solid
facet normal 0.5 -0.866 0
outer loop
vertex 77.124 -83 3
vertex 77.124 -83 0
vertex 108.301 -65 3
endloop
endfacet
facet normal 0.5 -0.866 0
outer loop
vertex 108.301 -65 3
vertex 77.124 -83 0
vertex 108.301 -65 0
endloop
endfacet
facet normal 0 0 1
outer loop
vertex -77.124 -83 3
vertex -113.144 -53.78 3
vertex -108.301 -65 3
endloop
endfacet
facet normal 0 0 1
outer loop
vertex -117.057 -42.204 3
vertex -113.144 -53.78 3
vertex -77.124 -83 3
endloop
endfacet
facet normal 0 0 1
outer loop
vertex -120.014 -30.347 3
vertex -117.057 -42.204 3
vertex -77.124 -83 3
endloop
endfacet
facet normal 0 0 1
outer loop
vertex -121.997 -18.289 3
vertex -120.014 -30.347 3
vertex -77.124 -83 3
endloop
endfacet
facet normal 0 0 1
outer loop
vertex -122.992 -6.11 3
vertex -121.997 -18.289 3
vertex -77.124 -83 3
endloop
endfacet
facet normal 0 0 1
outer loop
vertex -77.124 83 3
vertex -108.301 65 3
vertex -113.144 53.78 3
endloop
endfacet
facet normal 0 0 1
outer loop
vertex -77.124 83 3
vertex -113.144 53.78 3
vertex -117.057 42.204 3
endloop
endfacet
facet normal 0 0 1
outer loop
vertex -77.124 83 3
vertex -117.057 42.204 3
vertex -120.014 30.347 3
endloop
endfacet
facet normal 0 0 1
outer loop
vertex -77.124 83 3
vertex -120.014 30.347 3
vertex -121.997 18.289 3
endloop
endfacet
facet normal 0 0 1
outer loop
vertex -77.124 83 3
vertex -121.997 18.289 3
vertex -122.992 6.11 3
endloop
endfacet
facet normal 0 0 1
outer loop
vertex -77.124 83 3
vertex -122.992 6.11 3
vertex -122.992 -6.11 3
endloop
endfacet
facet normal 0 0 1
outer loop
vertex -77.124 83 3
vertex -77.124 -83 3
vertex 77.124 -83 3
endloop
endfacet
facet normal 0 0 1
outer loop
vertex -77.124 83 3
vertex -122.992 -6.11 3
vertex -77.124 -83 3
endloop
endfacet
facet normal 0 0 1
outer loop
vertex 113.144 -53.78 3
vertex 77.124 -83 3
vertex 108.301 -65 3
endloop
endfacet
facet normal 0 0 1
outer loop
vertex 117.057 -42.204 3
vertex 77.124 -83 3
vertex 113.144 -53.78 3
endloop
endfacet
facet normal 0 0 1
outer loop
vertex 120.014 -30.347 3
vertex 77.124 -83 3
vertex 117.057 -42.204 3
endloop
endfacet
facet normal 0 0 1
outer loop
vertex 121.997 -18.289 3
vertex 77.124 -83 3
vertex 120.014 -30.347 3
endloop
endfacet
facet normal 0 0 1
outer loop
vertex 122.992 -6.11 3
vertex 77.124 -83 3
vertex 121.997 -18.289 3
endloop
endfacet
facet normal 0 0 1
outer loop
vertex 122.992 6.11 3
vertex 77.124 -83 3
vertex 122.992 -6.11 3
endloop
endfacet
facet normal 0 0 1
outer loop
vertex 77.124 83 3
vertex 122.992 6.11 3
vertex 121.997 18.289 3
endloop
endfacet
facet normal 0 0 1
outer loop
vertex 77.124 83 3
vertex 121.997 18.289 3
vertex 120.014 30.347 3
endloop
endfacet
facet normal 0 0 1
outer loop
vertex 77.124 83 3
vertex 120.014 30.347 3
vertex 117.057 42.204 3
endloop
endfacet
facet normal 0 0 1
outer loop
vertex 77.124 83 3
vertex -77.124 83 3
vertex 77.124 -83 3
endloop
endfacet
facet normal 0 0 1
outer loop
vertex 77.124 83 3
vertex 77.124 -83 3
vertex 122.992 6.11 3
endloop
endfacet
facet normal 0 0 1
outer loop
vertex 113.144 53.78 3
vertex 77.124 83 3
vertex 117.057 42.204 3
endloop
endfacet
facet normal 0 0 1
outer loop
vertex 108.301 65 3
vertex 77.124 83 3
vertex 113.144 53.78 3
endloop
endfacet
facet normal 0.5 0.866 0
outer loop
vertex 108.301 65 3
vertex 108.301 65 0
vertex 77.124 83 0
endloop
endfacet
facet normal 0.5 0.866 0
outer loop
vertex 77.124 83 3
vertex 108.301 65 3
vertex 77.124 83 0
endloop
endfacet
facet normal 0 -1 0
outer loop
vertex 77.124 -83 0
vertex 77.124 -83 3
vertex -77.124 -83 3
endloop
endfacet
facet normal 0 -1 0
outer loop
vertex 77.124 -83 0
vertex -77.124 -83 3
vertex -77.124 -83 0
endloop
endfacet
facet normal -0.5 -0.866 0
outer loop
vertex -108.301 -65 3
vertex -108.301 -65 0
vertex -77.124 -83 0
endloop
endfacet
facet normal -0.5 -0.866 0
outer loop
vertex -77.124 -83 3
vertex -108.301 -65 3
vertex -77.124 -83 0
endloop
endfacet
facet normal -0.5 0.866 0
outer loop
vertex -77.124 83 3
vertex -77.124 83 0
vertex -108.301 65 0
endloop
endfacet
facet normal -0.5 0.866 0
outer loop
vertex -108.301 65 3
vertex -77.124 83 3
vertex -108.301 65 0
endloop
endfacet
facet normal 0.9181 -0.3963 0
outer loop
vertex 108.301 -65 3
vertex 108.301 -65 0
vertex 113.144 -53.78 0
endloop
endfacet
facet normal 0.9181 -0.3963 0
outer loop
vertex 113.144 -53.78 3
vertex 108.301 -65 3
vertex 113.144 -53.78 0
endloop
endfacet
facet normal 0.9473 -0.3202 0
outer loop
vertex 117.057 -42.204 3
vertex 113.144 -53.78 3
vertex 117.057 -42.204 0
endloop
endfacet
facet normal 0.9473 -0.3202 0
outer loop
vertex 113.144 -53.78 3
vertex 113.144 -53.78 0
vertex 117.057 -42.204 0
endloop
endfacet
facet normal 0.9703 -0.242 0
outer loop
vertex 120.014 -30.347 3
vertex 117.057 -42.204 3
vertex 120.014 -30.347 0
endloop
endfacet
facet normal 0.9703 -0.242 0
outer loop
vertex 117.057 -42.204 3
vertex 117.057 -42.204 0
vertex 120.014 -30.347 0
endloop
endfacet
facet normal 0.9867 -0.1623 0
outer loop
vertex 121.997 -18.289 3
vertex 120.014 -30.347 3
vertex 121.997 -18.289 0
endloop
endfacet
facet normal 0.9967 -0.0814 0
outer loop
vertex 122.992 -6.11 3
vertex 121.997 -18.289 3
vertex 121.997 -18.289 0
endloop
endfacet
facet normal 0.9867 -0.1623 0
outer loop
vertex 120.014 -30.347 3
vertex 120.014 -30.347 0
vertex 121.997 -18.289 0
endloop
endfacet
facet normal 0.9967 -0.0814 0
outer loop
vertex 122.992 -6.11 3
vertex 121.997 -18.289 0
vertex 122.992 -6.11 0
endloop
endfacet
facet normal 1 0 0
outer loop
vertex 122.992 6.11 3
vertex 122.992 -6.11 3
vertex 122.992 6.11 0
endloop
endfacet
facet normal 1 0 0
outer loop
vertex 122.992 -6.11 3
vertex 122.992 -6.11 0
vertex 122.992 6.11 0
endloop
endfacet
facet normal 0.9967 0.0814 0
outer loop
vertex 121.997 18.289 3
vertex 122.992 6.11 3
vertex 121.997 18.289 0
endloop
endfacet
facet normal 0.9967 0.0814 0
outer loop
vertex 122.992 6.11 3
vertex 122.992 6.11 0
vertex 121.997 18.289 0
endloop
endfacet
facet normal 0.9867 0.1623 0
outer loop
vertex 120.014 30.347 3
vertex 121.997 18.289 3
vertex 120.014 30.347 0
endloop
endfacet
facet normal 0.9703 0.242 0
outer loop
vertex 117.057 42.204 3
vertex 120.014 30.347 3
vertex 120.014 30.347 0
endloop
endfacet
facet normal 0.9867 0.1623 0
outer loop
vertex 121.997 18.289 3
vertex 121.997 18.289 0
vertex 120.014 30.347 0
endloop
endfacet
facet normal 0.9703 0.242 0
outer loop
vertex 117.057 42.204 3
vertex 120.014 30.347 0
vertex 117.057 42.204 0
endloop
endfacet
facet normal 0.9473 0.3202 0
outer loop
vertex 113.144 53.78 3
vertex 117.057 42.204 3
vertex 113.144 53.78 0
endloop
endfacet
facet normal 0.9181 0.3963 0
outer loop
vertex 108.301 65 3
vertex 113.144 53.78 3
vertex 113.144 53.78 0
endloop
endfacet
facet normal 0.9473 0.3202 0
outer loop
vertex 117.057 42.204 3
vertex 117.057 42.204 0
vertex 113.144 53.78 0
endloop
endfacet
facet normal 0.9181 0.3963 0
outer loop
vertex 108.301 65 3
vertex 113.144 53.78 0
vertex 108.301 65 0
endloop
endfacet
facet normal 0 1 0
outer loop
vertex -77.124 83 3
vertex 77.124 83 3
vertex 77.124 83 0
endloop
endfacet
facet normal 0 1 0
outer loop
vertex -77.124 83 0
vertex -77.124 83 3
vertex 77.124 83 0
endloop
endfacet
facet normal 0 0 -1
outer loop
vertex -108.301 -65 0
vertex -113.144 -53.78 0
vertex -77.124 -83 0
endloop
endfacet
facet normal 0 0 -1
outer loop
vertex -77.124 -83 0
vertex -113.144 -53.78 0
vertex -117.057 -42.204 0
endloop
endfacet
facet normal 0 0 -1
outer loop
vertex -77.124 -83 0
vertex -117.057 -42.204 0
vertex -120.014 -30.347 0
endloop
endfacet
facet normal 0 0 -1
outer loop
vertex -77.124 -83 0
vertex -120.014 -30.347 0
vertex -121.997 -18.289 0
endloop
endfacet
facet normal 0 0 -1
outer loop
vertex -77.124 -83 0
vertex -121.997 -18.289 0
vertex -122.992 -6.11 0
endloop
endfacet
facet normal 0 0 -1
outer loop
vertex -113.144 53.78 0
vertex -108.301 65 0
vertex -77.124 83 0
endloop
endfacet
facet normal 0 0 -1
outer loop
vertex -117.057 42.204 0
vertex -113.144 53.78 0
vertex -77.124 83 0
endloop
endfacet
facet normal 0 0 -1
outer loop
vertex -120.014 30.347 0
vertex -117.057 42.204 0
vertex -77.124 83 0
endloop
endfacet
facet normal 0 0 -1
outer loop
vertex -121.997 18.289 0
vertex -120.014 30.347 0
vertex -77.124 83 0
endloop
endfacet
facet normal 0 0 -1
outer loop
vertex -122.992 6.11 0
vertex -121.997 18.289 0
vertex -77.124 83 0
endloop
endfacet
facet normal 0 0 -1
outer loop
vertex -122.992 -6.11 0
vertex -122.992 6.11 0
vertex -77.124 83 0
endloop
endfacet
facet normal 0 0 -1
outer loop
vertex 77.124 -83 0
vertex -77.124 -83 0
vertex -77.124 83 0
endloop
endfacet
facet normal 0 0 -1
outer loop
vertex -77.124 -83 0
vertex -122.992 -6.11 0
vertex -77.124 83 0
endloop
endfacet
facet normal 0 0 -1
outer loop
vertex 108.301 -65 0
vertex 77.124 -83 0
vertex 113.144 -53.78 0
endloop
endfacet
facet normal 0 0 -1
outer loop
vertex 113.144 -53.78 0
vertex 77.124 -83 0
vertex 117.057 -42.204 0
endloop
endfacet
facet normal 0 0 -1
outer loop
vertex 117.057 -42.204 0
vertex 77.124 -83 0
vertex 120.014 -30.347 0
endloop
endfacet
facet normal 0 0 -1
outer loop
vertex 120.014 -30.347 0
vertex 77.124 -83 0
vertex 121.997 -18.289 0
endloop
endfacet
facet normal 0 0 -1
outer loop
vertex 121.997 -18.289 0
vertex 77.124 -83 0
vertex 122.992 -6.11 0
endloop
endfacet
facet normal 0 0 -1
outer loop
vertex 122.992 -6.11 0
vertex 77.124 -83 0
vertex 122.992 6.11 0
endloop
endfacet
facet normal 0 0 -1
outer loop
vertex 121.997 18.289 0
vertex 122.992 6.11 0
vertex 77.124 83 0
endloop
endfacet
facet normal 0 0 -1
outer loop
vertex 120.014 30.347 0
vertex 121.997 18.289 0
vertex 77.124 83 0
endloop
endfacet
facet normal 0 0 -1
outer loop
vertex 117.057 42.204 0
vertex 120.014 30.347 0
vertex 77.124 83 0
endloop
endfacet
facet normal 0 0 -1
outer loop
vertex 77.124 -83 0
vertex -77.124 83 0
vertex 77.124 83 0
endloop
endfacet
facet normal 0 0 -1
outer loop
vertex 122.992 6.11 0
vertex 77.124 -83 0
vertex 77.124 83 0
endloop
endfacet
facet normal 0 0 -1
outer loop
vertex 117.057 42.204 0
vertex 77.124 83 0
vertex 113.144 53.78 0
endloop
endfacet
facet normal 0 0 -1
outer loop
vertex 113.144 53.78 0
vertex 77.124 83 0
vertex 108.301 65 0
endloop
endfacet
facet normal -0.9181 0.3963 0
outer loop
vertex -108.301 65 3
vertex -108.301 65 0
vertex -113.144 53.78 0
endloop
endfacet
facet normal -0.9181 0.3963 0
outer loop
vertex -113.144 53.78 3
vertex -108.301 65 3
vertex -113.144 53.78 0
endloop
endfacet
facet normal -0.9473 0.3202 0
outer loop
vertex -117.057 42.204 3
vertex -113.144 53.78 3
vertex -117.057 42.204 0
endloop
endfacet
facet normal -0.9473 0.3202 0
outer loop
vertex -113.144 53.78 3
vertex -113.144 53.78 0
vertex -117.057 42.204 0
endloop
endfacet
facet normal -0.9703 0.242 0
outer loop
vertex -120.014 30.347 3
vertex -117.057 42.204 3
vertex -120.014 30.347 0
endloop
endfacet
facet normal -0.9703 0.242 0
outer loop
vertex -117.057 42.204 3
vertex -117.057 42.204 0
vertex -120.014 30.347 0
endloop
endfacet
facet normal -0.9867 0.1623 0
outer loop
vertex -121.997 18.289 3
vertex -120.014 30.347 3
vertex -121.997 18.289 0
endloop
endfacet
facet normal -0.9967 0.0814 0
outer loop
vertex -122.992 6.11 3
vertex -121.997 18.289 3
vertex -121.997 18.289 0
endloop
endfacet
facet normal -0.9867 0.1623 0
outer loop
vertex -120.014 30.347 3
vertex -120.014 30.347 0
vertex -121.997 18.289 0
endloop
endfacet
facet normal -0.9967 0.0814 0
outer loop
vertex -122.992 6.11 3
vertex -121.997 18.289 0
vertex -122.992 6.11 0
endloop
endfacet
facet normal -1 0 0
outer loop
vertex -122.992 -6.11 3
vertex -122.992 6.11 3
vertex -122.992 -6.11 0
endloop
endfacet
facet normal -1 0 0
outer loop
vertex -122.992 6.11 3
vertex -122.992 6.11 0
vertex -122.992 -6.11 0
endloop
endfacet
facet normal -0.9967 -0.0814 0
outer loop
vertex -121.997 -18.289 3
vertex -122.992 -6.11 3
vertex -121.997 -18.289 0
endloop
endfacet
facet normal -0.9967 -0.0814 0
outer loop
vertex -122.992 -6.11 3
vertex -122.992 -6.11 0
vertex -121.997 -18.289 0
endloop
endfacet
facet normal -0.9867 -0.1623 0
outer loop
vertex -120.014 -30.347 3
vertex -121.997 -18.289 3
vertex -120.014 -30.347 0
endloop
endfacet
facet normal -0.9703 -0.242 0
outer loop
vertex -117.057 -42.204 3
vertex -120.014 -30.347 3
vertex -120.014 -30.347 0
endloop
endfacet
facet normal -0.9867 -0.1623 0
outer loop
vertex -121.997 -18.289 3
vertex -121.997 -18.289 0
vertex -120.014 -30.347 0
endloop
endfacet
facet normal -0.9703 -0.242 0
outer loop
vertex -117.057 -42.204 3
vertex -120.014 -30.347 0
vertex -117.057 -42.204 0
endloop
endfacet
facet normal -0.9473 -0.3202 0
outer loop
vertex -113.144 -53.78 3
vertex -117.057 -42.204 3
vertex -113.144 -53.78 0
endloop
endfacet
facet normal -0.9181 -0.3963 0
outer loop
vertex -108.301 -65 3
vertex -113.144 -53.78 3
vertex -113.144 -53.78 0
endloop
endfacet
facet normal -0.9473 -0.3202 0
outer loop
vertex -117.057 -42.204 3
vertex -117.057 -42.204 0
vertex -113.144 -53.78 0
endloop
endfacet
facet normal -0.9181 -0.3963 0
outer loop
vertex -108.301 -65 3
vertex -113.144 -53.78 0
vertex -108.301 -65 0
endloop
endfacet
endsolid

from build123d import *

# Parameters (mm, degrees)
BOSS_EXTRUDE1_DEPTH      = 3
CUT_EXTRUDE21_DEPTH      = 153.533935957
CUT_EXTRUDE21_DEPTH_BACK = 153.533935957
SKETCH34_W               = 3
SKETCH34_H               = 7


with BuildPart() as part:
    # Sketch1 → Boss-Extrude1 (new body)
    with BuildSketch(Plane.XY):
        with BuildLine():
            Line((-65, 90), (-108.301270189, 65))
            ThreePointArc((-108.301270189, 65), (-123.116211843, 0), (-108.301270189, -65))
            Line((-108.301270189, -65), (-65, -90))
            Line((-65, -90), (65, -90))
            Line((65, -90), (108.301270189, -65))
            ThreePointArc((108.301270189, -65), (123.116211843, 0), (108.301270189, 65))
            Line((108.301270189, 65), (65, 90))
            Line((65, 90), (-65, 90))
        make_face()
    extrude(amount=BOSS_EXTRUDE1_DEPTH)

    # Sketch34 → Cut-Extrude21 (cut, two sides: drawn at the far end of the back side and taken through both)
    with BuildSketch(Plane(origin=(0, 0, 0), x_dir=(0, 0, -1), z_dir=(1, 0, 0)).offset(-CUT_EXTRUDE21_DEPTH_BACK)):
        with Locations((-1.5, 86.5)):
            Rectangle(SKETCH34_W, SKETCH34_H)
        with Locations((-1.5, -86.5)):
            Rectangle(SKETCH34_W, SKETCH34_H)
    extrude(amount=CUT_EXTRUDE21_DEPTH + CUT_EXTRUDE21_DEPTH_BACK, mode=Mode.SUBTRACT)


solid = part.part
